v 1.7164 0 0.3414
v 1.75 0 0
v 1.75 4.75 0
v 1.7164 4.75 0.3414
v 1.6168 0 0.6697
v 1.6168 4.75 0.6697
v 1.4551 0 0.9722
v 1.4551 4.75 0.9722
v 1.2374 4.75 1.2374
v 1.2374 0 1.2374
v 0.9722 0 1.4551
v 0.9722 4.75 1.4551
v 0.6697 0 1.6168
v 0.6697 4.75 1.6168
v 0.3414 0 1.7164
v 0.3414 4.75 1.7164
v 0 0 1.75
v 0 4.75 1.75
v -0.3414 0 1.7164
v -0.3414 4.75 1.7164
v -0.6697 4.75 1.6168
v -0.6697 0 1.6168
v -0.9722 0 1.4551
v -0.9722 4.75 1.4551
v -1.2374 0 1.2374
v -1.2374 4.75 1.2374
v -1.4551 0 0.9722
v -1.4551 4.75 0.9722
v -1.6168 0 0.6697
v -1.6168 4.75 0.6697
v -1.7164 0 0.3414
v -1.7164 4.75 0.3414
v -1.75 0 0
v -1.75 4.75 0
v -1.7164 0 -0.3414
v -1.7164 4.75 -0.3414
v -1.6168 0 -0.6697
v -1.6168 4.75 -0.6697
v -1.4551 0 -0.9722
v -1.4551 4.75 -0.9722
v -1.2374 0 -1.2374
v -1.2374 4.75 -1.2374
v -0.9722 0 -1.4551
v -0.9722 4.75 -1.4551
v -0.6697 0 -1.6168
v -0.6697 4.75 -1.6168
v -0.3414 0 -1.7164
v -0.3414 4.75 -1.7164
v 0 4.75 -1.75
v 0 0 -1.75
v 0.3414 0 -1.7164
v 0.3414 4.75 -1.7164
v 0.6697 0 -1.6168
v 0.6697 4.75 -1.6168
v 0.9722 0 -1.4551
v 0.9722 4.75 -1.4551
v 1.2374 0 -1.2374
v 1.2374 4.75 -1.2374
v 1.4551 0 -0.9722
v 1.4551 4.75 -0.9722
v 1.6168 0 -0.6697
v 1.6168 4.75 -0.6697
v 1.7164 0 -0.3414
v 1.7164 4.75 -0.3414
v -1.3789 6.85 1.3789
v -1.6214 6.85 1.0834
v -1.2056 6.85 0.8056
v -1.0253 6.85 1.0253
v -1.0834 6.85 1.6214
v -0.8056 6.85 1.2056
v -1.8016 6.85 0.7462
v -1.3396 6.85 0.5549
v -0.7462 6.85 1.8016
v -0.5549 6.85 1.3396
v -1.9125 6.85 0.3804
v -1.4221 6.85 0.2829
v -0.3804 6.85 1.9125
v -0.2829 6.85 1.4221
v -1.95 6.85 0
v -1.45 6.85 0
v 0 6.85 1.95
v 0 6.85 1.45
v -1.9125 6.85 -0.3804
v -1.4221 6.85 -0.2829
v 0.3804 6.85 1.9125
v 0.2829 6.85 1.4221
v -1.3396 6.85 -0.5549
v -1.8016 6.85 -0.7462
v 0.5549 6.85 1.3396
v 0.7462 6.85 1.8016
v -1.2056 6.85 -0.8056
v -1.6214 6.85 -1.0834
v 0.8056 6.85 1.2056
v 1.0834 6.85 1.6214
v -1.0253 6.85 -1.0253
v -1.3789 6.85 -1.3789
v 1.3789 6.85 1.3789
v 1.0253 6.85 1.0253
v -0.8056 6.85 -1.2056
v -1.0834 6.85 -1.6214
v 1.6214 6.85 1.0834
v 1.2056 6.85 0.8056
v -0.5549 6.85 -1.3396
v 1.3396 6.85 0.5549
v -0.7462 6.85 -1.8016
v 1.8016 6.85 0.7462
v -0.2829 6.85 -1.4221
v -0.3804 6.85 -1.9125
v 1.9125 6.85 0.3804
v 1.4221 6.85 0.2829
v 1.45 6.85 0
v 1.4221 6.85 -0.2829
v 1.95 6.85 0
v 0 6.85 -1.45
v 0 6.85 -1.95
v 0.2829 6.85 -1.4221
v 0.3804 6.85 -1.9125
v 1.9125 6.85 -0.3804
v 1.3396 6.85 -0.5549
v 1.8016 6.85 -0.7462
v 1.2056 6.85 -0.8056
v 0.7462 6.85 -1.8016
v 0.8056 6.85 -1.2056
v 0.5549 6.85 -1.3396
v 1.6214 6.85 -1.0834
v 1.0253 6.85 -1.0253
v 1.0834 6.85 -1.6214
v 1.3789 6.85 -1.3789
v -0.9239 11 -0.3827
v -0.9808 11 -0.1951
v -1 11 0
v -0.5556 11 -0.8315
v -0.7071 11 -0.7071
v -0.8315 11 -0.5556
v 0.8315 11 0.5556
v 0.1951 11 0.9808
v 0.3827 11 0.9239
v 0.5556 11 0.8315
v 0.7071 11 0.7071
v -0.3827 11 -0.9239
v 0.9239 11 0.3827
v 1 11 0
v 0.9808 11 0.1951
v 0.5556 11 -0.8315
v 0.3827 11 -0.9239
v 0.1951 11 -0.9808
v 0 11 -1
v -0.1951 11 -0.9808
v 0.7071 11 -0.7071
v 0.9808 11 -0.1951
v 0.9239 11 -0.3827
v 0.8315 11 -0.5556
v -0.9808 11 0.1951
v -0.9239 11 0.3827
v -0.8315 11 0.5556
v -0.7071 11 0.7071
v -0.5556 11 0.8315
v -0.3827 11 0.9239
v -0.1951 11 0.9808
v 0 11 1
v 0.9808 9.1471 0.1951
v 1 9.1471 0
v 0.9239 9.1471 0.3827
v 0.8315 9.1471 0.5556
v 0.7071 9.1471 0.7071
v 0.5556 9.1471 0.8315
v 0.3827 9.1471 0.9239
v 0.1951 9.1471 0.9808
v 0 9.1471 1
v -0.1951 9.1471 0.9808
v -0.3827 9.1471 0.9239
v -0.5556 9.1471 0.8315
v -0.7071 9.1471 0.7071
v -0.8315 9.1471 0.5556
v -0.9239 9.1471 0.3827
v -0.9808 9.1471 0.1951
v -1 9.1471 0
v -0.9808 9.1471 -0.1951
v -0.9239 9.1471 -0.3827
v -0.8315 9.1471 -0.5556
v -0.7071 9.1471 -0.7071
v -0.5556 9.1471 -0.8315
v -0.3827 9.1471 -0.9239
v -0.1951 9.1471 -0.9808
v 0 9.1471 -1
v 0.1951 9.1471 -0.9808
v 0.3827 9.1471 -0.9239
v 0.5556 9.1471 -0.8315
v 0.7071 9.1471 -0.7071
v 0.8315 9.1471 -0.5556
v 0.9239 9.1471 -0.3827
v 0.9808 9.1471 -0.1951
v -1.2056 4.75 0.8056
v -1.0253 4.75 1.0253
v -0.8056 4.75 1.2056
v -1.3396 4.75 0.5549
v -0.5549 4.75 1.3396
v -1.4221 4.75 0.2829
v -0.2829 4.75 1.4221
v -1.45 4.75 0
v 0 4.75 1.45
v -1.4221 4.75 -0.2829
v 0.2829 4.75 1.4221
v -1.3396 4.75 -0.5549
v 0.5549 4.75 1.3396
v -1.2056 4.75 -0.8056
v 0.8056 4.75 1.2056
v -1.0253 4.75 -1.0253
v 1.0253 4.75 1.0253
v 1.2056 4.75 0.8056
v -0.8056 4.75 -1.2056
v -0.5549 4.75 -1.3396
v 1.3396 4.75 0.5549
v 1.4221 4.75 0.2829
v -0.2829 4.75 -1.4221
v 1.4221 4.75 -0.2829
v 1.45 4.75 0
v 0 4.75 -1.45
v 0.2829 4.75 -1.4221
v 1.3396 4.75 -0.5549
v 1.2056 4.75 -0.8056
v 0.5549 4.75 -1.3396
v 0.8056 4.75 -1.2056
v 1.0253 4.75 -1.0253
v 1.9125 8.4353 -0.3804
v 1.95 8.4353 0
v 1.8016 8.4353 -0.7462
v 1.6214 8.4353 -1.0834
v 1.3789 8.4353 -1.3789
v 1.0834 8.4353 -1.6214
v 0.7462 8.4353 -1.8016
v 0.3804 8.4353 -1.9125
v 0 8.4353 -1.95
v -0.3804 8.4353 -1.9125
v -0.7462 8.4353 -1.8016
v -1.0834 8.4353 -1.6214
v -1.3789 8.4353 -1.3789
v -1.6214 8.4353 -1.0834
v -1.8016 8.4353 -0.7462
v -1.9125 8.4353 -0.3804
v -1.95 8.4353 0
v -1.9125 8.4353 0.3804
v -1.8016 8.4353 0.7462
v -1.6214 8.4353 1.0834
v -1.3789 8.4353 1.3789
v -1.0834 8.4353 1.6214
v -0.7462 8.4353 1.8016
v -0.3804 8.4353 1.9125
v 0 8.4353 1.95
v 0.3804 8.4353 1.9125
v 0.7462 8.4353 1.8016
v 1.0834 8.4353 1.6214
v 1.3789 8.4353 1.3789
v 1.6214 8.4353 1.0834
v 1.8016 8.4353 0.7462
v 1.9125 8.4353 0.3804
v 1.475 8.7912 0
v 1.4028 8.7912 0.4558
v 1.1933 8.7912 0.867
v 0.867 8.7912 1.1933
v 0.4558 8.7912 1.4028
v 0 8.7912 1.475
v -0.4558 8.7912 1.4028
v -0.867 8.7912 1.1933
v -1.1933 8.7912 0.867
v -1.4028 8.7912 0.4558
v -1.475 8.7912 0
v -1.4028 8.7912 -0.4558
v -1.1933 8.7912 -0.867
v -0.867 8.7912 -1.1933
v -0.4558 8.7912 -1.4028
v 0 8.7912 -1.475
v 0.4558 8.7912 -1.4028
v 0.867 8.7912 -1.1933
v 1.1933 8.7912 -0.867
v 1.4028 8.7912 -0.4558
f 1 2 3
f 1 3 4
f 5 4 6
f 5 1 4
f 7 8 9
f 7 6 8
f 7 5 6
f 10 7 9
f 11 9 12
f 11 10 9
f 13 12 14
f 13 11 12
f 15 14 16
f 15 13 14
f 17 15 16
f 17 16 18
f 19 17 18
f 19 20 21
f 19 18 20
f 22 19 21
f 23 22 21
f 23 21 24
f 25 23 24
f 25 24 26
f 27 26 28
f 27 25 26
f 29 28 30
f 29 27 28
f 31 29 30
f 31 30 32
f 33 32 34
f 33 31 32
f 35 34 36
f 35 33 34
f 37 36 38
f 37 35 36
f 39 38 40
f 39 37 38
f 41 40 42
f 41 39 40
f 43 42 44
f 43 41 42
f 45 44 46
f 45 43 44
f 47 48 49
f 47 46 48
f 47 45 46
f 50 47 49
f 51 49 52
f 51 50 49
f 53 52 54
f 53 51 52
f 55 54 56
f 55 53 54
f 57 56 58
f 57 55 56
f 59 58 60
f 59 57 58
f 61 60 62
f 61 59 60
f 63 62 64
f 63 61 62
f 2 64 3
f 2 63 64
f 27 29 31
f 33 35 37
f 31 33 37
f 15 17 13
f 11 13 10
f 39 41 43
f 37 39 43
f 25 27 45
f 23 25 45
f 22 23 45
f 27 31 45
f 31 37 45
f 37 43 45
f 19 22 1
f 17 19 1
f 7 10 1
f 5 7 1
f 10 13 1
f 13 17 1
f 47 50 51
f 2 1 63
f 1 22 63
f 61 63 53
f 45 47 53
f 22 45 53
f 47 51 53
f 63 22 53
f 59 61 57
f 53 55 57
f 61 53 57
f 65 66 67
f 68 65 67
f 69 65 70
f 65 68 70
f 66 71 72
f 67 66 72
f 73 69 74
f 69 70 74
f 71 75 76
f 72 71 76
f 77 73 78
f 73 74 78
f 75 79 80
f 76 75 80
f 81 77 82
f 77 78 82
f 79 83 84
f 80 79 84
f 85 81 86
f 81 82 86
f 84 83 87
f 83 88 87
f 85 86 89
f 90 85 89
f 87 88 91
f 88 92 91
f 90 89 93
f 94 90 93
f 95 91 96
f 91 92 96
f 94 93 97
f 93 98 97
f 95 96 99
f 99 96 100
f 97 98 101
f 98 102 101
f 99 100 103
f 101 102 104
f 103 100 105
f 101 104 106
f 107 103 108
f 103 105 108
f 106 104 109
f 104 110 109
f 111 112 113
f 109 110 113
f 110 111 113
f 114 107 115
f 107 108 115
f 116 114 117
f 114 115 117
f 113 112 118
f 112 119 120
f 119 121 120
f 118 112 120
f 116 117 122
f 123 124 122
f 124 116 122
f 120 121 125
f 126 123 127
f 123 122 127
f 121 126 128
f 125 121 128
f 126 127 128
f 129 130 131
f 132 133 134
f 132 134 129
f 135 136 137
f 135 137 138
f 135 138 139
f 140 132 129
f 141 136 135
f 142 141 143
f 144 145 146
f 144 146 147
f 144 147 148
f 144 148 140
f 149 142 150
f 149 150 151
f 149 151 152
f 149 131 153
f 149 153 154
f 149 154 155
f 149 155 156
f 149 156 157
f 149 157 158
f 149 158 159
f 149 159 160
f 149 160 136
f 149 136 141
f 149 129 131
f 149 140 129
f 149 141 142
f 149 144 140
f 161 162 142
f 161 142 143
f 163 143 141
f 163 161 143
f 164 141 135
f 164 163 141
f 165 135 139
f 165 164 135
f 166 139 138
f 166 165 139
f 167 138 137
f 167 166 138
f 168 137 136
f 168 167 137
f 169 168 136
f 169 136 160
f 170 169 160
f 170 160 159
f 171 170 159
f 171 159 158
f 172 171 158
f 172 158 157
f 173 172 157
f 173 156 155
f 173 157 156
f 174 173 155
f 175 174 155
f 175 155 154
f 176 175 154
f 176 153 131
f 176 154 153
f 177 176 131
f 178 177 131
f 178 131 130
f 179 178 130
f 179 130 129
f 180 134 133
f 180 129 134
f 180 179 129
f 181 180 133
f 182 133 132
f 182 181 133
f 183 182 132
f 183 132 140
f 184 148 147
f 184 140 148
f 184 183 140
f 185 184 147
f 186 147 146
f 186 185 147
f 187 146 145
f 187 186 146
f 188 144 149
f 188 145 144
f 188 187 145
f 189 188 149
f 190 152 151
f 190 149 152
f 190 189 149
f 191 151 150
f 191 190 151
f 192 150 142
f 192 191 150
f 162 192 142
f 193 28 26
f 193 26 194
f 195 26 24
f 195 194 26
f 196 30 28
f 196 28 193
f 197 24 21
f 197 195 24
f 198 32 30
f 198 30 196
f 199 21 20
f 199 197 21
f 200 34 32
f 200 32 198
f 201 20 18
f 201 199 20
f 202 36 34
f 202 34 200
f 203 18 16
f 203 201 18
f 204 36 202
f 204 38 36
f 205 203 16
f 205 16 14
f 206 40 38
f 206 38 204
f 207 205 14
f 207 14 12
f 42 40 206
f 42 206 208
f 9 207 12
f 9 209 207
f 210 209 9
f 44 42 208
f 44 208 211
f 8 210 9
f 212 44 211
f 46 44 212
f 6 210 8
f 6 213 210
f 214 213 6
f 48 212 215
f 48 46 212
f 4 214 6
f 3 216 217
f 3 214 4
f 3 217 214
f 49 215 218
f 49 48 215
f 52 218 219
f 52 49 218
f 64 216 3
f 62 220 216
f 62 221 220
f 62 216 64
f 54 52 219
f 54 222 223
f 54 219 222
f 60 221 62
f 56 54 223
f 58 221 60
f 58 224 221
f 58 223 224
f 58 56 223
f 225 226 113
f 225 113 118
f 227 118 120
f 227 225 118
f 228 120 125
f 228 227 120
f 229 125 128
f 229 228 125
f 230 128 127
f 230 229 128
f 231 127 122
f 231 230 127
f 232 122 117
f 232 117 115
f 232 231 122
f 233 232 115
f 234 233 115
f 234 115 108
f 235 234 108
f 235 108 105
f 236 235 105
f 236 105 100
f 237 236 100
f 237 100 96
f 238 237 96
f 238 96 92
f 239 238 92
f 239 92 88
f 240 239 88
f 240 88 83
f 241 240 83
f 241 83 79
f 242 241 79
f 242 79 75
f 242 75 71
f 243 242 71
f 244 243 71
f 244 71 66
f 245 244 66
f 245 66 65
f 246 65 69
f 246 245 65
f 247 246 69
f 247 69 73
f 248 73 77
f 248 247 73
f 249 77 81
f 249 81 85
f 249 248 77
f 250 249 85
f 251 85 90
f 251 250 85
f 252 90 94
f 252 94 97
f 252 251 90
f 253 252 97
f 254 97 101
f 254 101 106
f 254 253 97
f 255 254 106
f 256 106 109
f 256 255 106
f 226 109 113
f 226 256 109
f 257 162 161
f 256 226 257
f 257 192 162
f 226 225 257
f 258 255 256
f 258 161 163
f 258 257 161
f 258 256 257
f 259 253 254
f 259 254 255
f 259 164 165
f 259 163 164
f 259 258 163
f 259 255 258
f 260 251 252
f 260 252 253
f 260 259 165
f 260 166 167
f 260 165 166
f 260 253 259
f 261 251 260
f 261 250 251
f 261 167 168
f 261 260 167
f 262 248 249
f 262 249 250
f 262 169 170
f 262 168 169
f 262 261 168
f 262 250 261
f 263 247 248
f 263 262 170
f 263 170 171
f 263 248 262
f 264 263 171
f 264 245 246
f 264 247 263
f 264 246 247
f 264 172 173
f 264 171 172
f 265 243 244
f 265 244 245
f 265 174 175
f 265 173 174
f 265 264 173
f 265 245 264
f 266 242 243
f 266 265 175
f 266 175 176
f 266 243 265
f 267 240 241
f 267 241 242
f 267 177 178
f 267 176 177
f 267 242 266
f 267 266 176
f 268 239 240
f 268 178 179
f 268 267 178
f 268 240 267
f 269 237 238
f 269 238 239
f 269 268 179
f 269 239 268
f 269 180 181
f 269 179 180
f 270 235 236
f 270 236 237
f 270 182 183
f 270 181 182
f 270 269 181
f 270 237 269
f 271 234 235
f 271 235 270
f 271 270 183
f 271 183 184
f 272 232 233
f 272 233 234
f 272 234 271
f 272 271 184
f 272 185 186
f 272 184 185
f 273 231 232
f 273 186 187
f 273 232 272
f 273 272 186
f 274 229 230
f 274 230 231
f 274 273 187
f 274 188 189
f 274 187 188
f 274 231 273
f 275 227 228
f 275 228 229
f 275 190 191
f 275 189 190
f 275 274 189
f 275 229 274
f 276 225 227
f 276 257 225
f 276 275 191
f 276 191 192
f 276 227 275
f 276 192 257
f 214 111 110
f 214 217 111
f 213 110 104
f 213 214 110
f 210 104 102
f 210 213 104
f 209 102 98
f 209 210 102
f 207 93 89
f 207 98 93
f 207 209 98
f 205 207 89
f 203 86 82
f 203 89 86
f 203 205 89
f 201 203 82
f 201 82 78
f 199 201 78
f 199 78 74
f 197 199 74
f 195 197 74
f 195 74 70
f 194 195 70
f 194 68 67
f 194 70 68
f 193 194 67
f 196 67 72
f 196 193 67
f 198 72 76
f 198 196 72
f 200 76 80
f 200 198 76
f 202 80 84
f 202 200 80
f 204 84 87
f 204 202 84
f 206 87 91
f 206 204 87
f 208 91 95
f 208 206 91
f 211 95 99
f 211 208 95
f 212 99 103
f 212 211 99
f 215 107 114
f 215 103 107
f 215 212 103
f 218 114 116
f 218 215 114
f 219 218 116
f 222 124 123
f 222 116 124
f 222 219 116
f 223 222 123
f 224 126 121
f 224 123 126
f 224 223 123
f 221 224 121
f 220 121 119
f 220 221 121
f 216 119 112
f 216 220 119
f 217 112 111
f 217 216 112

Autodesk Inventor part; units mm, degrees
ref_plane "YZ Plane" through (0, 0, 0) normal (1, 0, 0) x (0, 1, 0)
ref_plane "XZ Plane" through (0, 0, 0) normal (0, 1, 0) x (-1, 0, 0)
ref_plane "XY Plane" through (0, 0, 0) normal (0, 0, 1) x (1, 0, 0)
sketch "Esboço1" plane through (0, 0, 0) normal (0, 0, 1) x (1, 0, 0)
  line L0 (0, 0) -> (0, 11)
  line L1 (0, 5) -> (-10.2862, 5) construction
  line L2 (0, 9.05) -> (6.4587, 9.05) construction
  line L3 (3.2294, 11) -> (3.2294, 8.5) construction
  line L4 (1.95, 8.4353) -> (1, 9.1471)
  line L5 (1.95, 6.85) -> (1.95, 8.4353)
  line L6 (1.45, 6.85) -> (1.95, 6.85)
  line L7 (1.45, 6.85) -> (1.45, 4.75)
  line L8 (0, 4.75) -> (6.1218, 4.75) construction
  line L9 (1.75, 4.75) -> (1.75, 0)
  line L10 (1.75, 4.75) -> (1.45, 4.75)
  line L11 (0, 11) -> (1, 11)
  line L12 (1, 11) -> (1, 9.1471)
  line L13 (0, 0) -> (1.75, 0)
  point P0 (0, 0)
  dimension "d17" = 1
  dimension "d24" = 1.95
  dimension "d25" = 1.75
  dimension "d26" = 2.1
  dimension "d27" = 1.45
revolve "Revolução1" add sketch "Esboço1" angle 360 about axis through (0, 0, 0) along (0, 1, 0)
properties part number "travaInternaRoda"
